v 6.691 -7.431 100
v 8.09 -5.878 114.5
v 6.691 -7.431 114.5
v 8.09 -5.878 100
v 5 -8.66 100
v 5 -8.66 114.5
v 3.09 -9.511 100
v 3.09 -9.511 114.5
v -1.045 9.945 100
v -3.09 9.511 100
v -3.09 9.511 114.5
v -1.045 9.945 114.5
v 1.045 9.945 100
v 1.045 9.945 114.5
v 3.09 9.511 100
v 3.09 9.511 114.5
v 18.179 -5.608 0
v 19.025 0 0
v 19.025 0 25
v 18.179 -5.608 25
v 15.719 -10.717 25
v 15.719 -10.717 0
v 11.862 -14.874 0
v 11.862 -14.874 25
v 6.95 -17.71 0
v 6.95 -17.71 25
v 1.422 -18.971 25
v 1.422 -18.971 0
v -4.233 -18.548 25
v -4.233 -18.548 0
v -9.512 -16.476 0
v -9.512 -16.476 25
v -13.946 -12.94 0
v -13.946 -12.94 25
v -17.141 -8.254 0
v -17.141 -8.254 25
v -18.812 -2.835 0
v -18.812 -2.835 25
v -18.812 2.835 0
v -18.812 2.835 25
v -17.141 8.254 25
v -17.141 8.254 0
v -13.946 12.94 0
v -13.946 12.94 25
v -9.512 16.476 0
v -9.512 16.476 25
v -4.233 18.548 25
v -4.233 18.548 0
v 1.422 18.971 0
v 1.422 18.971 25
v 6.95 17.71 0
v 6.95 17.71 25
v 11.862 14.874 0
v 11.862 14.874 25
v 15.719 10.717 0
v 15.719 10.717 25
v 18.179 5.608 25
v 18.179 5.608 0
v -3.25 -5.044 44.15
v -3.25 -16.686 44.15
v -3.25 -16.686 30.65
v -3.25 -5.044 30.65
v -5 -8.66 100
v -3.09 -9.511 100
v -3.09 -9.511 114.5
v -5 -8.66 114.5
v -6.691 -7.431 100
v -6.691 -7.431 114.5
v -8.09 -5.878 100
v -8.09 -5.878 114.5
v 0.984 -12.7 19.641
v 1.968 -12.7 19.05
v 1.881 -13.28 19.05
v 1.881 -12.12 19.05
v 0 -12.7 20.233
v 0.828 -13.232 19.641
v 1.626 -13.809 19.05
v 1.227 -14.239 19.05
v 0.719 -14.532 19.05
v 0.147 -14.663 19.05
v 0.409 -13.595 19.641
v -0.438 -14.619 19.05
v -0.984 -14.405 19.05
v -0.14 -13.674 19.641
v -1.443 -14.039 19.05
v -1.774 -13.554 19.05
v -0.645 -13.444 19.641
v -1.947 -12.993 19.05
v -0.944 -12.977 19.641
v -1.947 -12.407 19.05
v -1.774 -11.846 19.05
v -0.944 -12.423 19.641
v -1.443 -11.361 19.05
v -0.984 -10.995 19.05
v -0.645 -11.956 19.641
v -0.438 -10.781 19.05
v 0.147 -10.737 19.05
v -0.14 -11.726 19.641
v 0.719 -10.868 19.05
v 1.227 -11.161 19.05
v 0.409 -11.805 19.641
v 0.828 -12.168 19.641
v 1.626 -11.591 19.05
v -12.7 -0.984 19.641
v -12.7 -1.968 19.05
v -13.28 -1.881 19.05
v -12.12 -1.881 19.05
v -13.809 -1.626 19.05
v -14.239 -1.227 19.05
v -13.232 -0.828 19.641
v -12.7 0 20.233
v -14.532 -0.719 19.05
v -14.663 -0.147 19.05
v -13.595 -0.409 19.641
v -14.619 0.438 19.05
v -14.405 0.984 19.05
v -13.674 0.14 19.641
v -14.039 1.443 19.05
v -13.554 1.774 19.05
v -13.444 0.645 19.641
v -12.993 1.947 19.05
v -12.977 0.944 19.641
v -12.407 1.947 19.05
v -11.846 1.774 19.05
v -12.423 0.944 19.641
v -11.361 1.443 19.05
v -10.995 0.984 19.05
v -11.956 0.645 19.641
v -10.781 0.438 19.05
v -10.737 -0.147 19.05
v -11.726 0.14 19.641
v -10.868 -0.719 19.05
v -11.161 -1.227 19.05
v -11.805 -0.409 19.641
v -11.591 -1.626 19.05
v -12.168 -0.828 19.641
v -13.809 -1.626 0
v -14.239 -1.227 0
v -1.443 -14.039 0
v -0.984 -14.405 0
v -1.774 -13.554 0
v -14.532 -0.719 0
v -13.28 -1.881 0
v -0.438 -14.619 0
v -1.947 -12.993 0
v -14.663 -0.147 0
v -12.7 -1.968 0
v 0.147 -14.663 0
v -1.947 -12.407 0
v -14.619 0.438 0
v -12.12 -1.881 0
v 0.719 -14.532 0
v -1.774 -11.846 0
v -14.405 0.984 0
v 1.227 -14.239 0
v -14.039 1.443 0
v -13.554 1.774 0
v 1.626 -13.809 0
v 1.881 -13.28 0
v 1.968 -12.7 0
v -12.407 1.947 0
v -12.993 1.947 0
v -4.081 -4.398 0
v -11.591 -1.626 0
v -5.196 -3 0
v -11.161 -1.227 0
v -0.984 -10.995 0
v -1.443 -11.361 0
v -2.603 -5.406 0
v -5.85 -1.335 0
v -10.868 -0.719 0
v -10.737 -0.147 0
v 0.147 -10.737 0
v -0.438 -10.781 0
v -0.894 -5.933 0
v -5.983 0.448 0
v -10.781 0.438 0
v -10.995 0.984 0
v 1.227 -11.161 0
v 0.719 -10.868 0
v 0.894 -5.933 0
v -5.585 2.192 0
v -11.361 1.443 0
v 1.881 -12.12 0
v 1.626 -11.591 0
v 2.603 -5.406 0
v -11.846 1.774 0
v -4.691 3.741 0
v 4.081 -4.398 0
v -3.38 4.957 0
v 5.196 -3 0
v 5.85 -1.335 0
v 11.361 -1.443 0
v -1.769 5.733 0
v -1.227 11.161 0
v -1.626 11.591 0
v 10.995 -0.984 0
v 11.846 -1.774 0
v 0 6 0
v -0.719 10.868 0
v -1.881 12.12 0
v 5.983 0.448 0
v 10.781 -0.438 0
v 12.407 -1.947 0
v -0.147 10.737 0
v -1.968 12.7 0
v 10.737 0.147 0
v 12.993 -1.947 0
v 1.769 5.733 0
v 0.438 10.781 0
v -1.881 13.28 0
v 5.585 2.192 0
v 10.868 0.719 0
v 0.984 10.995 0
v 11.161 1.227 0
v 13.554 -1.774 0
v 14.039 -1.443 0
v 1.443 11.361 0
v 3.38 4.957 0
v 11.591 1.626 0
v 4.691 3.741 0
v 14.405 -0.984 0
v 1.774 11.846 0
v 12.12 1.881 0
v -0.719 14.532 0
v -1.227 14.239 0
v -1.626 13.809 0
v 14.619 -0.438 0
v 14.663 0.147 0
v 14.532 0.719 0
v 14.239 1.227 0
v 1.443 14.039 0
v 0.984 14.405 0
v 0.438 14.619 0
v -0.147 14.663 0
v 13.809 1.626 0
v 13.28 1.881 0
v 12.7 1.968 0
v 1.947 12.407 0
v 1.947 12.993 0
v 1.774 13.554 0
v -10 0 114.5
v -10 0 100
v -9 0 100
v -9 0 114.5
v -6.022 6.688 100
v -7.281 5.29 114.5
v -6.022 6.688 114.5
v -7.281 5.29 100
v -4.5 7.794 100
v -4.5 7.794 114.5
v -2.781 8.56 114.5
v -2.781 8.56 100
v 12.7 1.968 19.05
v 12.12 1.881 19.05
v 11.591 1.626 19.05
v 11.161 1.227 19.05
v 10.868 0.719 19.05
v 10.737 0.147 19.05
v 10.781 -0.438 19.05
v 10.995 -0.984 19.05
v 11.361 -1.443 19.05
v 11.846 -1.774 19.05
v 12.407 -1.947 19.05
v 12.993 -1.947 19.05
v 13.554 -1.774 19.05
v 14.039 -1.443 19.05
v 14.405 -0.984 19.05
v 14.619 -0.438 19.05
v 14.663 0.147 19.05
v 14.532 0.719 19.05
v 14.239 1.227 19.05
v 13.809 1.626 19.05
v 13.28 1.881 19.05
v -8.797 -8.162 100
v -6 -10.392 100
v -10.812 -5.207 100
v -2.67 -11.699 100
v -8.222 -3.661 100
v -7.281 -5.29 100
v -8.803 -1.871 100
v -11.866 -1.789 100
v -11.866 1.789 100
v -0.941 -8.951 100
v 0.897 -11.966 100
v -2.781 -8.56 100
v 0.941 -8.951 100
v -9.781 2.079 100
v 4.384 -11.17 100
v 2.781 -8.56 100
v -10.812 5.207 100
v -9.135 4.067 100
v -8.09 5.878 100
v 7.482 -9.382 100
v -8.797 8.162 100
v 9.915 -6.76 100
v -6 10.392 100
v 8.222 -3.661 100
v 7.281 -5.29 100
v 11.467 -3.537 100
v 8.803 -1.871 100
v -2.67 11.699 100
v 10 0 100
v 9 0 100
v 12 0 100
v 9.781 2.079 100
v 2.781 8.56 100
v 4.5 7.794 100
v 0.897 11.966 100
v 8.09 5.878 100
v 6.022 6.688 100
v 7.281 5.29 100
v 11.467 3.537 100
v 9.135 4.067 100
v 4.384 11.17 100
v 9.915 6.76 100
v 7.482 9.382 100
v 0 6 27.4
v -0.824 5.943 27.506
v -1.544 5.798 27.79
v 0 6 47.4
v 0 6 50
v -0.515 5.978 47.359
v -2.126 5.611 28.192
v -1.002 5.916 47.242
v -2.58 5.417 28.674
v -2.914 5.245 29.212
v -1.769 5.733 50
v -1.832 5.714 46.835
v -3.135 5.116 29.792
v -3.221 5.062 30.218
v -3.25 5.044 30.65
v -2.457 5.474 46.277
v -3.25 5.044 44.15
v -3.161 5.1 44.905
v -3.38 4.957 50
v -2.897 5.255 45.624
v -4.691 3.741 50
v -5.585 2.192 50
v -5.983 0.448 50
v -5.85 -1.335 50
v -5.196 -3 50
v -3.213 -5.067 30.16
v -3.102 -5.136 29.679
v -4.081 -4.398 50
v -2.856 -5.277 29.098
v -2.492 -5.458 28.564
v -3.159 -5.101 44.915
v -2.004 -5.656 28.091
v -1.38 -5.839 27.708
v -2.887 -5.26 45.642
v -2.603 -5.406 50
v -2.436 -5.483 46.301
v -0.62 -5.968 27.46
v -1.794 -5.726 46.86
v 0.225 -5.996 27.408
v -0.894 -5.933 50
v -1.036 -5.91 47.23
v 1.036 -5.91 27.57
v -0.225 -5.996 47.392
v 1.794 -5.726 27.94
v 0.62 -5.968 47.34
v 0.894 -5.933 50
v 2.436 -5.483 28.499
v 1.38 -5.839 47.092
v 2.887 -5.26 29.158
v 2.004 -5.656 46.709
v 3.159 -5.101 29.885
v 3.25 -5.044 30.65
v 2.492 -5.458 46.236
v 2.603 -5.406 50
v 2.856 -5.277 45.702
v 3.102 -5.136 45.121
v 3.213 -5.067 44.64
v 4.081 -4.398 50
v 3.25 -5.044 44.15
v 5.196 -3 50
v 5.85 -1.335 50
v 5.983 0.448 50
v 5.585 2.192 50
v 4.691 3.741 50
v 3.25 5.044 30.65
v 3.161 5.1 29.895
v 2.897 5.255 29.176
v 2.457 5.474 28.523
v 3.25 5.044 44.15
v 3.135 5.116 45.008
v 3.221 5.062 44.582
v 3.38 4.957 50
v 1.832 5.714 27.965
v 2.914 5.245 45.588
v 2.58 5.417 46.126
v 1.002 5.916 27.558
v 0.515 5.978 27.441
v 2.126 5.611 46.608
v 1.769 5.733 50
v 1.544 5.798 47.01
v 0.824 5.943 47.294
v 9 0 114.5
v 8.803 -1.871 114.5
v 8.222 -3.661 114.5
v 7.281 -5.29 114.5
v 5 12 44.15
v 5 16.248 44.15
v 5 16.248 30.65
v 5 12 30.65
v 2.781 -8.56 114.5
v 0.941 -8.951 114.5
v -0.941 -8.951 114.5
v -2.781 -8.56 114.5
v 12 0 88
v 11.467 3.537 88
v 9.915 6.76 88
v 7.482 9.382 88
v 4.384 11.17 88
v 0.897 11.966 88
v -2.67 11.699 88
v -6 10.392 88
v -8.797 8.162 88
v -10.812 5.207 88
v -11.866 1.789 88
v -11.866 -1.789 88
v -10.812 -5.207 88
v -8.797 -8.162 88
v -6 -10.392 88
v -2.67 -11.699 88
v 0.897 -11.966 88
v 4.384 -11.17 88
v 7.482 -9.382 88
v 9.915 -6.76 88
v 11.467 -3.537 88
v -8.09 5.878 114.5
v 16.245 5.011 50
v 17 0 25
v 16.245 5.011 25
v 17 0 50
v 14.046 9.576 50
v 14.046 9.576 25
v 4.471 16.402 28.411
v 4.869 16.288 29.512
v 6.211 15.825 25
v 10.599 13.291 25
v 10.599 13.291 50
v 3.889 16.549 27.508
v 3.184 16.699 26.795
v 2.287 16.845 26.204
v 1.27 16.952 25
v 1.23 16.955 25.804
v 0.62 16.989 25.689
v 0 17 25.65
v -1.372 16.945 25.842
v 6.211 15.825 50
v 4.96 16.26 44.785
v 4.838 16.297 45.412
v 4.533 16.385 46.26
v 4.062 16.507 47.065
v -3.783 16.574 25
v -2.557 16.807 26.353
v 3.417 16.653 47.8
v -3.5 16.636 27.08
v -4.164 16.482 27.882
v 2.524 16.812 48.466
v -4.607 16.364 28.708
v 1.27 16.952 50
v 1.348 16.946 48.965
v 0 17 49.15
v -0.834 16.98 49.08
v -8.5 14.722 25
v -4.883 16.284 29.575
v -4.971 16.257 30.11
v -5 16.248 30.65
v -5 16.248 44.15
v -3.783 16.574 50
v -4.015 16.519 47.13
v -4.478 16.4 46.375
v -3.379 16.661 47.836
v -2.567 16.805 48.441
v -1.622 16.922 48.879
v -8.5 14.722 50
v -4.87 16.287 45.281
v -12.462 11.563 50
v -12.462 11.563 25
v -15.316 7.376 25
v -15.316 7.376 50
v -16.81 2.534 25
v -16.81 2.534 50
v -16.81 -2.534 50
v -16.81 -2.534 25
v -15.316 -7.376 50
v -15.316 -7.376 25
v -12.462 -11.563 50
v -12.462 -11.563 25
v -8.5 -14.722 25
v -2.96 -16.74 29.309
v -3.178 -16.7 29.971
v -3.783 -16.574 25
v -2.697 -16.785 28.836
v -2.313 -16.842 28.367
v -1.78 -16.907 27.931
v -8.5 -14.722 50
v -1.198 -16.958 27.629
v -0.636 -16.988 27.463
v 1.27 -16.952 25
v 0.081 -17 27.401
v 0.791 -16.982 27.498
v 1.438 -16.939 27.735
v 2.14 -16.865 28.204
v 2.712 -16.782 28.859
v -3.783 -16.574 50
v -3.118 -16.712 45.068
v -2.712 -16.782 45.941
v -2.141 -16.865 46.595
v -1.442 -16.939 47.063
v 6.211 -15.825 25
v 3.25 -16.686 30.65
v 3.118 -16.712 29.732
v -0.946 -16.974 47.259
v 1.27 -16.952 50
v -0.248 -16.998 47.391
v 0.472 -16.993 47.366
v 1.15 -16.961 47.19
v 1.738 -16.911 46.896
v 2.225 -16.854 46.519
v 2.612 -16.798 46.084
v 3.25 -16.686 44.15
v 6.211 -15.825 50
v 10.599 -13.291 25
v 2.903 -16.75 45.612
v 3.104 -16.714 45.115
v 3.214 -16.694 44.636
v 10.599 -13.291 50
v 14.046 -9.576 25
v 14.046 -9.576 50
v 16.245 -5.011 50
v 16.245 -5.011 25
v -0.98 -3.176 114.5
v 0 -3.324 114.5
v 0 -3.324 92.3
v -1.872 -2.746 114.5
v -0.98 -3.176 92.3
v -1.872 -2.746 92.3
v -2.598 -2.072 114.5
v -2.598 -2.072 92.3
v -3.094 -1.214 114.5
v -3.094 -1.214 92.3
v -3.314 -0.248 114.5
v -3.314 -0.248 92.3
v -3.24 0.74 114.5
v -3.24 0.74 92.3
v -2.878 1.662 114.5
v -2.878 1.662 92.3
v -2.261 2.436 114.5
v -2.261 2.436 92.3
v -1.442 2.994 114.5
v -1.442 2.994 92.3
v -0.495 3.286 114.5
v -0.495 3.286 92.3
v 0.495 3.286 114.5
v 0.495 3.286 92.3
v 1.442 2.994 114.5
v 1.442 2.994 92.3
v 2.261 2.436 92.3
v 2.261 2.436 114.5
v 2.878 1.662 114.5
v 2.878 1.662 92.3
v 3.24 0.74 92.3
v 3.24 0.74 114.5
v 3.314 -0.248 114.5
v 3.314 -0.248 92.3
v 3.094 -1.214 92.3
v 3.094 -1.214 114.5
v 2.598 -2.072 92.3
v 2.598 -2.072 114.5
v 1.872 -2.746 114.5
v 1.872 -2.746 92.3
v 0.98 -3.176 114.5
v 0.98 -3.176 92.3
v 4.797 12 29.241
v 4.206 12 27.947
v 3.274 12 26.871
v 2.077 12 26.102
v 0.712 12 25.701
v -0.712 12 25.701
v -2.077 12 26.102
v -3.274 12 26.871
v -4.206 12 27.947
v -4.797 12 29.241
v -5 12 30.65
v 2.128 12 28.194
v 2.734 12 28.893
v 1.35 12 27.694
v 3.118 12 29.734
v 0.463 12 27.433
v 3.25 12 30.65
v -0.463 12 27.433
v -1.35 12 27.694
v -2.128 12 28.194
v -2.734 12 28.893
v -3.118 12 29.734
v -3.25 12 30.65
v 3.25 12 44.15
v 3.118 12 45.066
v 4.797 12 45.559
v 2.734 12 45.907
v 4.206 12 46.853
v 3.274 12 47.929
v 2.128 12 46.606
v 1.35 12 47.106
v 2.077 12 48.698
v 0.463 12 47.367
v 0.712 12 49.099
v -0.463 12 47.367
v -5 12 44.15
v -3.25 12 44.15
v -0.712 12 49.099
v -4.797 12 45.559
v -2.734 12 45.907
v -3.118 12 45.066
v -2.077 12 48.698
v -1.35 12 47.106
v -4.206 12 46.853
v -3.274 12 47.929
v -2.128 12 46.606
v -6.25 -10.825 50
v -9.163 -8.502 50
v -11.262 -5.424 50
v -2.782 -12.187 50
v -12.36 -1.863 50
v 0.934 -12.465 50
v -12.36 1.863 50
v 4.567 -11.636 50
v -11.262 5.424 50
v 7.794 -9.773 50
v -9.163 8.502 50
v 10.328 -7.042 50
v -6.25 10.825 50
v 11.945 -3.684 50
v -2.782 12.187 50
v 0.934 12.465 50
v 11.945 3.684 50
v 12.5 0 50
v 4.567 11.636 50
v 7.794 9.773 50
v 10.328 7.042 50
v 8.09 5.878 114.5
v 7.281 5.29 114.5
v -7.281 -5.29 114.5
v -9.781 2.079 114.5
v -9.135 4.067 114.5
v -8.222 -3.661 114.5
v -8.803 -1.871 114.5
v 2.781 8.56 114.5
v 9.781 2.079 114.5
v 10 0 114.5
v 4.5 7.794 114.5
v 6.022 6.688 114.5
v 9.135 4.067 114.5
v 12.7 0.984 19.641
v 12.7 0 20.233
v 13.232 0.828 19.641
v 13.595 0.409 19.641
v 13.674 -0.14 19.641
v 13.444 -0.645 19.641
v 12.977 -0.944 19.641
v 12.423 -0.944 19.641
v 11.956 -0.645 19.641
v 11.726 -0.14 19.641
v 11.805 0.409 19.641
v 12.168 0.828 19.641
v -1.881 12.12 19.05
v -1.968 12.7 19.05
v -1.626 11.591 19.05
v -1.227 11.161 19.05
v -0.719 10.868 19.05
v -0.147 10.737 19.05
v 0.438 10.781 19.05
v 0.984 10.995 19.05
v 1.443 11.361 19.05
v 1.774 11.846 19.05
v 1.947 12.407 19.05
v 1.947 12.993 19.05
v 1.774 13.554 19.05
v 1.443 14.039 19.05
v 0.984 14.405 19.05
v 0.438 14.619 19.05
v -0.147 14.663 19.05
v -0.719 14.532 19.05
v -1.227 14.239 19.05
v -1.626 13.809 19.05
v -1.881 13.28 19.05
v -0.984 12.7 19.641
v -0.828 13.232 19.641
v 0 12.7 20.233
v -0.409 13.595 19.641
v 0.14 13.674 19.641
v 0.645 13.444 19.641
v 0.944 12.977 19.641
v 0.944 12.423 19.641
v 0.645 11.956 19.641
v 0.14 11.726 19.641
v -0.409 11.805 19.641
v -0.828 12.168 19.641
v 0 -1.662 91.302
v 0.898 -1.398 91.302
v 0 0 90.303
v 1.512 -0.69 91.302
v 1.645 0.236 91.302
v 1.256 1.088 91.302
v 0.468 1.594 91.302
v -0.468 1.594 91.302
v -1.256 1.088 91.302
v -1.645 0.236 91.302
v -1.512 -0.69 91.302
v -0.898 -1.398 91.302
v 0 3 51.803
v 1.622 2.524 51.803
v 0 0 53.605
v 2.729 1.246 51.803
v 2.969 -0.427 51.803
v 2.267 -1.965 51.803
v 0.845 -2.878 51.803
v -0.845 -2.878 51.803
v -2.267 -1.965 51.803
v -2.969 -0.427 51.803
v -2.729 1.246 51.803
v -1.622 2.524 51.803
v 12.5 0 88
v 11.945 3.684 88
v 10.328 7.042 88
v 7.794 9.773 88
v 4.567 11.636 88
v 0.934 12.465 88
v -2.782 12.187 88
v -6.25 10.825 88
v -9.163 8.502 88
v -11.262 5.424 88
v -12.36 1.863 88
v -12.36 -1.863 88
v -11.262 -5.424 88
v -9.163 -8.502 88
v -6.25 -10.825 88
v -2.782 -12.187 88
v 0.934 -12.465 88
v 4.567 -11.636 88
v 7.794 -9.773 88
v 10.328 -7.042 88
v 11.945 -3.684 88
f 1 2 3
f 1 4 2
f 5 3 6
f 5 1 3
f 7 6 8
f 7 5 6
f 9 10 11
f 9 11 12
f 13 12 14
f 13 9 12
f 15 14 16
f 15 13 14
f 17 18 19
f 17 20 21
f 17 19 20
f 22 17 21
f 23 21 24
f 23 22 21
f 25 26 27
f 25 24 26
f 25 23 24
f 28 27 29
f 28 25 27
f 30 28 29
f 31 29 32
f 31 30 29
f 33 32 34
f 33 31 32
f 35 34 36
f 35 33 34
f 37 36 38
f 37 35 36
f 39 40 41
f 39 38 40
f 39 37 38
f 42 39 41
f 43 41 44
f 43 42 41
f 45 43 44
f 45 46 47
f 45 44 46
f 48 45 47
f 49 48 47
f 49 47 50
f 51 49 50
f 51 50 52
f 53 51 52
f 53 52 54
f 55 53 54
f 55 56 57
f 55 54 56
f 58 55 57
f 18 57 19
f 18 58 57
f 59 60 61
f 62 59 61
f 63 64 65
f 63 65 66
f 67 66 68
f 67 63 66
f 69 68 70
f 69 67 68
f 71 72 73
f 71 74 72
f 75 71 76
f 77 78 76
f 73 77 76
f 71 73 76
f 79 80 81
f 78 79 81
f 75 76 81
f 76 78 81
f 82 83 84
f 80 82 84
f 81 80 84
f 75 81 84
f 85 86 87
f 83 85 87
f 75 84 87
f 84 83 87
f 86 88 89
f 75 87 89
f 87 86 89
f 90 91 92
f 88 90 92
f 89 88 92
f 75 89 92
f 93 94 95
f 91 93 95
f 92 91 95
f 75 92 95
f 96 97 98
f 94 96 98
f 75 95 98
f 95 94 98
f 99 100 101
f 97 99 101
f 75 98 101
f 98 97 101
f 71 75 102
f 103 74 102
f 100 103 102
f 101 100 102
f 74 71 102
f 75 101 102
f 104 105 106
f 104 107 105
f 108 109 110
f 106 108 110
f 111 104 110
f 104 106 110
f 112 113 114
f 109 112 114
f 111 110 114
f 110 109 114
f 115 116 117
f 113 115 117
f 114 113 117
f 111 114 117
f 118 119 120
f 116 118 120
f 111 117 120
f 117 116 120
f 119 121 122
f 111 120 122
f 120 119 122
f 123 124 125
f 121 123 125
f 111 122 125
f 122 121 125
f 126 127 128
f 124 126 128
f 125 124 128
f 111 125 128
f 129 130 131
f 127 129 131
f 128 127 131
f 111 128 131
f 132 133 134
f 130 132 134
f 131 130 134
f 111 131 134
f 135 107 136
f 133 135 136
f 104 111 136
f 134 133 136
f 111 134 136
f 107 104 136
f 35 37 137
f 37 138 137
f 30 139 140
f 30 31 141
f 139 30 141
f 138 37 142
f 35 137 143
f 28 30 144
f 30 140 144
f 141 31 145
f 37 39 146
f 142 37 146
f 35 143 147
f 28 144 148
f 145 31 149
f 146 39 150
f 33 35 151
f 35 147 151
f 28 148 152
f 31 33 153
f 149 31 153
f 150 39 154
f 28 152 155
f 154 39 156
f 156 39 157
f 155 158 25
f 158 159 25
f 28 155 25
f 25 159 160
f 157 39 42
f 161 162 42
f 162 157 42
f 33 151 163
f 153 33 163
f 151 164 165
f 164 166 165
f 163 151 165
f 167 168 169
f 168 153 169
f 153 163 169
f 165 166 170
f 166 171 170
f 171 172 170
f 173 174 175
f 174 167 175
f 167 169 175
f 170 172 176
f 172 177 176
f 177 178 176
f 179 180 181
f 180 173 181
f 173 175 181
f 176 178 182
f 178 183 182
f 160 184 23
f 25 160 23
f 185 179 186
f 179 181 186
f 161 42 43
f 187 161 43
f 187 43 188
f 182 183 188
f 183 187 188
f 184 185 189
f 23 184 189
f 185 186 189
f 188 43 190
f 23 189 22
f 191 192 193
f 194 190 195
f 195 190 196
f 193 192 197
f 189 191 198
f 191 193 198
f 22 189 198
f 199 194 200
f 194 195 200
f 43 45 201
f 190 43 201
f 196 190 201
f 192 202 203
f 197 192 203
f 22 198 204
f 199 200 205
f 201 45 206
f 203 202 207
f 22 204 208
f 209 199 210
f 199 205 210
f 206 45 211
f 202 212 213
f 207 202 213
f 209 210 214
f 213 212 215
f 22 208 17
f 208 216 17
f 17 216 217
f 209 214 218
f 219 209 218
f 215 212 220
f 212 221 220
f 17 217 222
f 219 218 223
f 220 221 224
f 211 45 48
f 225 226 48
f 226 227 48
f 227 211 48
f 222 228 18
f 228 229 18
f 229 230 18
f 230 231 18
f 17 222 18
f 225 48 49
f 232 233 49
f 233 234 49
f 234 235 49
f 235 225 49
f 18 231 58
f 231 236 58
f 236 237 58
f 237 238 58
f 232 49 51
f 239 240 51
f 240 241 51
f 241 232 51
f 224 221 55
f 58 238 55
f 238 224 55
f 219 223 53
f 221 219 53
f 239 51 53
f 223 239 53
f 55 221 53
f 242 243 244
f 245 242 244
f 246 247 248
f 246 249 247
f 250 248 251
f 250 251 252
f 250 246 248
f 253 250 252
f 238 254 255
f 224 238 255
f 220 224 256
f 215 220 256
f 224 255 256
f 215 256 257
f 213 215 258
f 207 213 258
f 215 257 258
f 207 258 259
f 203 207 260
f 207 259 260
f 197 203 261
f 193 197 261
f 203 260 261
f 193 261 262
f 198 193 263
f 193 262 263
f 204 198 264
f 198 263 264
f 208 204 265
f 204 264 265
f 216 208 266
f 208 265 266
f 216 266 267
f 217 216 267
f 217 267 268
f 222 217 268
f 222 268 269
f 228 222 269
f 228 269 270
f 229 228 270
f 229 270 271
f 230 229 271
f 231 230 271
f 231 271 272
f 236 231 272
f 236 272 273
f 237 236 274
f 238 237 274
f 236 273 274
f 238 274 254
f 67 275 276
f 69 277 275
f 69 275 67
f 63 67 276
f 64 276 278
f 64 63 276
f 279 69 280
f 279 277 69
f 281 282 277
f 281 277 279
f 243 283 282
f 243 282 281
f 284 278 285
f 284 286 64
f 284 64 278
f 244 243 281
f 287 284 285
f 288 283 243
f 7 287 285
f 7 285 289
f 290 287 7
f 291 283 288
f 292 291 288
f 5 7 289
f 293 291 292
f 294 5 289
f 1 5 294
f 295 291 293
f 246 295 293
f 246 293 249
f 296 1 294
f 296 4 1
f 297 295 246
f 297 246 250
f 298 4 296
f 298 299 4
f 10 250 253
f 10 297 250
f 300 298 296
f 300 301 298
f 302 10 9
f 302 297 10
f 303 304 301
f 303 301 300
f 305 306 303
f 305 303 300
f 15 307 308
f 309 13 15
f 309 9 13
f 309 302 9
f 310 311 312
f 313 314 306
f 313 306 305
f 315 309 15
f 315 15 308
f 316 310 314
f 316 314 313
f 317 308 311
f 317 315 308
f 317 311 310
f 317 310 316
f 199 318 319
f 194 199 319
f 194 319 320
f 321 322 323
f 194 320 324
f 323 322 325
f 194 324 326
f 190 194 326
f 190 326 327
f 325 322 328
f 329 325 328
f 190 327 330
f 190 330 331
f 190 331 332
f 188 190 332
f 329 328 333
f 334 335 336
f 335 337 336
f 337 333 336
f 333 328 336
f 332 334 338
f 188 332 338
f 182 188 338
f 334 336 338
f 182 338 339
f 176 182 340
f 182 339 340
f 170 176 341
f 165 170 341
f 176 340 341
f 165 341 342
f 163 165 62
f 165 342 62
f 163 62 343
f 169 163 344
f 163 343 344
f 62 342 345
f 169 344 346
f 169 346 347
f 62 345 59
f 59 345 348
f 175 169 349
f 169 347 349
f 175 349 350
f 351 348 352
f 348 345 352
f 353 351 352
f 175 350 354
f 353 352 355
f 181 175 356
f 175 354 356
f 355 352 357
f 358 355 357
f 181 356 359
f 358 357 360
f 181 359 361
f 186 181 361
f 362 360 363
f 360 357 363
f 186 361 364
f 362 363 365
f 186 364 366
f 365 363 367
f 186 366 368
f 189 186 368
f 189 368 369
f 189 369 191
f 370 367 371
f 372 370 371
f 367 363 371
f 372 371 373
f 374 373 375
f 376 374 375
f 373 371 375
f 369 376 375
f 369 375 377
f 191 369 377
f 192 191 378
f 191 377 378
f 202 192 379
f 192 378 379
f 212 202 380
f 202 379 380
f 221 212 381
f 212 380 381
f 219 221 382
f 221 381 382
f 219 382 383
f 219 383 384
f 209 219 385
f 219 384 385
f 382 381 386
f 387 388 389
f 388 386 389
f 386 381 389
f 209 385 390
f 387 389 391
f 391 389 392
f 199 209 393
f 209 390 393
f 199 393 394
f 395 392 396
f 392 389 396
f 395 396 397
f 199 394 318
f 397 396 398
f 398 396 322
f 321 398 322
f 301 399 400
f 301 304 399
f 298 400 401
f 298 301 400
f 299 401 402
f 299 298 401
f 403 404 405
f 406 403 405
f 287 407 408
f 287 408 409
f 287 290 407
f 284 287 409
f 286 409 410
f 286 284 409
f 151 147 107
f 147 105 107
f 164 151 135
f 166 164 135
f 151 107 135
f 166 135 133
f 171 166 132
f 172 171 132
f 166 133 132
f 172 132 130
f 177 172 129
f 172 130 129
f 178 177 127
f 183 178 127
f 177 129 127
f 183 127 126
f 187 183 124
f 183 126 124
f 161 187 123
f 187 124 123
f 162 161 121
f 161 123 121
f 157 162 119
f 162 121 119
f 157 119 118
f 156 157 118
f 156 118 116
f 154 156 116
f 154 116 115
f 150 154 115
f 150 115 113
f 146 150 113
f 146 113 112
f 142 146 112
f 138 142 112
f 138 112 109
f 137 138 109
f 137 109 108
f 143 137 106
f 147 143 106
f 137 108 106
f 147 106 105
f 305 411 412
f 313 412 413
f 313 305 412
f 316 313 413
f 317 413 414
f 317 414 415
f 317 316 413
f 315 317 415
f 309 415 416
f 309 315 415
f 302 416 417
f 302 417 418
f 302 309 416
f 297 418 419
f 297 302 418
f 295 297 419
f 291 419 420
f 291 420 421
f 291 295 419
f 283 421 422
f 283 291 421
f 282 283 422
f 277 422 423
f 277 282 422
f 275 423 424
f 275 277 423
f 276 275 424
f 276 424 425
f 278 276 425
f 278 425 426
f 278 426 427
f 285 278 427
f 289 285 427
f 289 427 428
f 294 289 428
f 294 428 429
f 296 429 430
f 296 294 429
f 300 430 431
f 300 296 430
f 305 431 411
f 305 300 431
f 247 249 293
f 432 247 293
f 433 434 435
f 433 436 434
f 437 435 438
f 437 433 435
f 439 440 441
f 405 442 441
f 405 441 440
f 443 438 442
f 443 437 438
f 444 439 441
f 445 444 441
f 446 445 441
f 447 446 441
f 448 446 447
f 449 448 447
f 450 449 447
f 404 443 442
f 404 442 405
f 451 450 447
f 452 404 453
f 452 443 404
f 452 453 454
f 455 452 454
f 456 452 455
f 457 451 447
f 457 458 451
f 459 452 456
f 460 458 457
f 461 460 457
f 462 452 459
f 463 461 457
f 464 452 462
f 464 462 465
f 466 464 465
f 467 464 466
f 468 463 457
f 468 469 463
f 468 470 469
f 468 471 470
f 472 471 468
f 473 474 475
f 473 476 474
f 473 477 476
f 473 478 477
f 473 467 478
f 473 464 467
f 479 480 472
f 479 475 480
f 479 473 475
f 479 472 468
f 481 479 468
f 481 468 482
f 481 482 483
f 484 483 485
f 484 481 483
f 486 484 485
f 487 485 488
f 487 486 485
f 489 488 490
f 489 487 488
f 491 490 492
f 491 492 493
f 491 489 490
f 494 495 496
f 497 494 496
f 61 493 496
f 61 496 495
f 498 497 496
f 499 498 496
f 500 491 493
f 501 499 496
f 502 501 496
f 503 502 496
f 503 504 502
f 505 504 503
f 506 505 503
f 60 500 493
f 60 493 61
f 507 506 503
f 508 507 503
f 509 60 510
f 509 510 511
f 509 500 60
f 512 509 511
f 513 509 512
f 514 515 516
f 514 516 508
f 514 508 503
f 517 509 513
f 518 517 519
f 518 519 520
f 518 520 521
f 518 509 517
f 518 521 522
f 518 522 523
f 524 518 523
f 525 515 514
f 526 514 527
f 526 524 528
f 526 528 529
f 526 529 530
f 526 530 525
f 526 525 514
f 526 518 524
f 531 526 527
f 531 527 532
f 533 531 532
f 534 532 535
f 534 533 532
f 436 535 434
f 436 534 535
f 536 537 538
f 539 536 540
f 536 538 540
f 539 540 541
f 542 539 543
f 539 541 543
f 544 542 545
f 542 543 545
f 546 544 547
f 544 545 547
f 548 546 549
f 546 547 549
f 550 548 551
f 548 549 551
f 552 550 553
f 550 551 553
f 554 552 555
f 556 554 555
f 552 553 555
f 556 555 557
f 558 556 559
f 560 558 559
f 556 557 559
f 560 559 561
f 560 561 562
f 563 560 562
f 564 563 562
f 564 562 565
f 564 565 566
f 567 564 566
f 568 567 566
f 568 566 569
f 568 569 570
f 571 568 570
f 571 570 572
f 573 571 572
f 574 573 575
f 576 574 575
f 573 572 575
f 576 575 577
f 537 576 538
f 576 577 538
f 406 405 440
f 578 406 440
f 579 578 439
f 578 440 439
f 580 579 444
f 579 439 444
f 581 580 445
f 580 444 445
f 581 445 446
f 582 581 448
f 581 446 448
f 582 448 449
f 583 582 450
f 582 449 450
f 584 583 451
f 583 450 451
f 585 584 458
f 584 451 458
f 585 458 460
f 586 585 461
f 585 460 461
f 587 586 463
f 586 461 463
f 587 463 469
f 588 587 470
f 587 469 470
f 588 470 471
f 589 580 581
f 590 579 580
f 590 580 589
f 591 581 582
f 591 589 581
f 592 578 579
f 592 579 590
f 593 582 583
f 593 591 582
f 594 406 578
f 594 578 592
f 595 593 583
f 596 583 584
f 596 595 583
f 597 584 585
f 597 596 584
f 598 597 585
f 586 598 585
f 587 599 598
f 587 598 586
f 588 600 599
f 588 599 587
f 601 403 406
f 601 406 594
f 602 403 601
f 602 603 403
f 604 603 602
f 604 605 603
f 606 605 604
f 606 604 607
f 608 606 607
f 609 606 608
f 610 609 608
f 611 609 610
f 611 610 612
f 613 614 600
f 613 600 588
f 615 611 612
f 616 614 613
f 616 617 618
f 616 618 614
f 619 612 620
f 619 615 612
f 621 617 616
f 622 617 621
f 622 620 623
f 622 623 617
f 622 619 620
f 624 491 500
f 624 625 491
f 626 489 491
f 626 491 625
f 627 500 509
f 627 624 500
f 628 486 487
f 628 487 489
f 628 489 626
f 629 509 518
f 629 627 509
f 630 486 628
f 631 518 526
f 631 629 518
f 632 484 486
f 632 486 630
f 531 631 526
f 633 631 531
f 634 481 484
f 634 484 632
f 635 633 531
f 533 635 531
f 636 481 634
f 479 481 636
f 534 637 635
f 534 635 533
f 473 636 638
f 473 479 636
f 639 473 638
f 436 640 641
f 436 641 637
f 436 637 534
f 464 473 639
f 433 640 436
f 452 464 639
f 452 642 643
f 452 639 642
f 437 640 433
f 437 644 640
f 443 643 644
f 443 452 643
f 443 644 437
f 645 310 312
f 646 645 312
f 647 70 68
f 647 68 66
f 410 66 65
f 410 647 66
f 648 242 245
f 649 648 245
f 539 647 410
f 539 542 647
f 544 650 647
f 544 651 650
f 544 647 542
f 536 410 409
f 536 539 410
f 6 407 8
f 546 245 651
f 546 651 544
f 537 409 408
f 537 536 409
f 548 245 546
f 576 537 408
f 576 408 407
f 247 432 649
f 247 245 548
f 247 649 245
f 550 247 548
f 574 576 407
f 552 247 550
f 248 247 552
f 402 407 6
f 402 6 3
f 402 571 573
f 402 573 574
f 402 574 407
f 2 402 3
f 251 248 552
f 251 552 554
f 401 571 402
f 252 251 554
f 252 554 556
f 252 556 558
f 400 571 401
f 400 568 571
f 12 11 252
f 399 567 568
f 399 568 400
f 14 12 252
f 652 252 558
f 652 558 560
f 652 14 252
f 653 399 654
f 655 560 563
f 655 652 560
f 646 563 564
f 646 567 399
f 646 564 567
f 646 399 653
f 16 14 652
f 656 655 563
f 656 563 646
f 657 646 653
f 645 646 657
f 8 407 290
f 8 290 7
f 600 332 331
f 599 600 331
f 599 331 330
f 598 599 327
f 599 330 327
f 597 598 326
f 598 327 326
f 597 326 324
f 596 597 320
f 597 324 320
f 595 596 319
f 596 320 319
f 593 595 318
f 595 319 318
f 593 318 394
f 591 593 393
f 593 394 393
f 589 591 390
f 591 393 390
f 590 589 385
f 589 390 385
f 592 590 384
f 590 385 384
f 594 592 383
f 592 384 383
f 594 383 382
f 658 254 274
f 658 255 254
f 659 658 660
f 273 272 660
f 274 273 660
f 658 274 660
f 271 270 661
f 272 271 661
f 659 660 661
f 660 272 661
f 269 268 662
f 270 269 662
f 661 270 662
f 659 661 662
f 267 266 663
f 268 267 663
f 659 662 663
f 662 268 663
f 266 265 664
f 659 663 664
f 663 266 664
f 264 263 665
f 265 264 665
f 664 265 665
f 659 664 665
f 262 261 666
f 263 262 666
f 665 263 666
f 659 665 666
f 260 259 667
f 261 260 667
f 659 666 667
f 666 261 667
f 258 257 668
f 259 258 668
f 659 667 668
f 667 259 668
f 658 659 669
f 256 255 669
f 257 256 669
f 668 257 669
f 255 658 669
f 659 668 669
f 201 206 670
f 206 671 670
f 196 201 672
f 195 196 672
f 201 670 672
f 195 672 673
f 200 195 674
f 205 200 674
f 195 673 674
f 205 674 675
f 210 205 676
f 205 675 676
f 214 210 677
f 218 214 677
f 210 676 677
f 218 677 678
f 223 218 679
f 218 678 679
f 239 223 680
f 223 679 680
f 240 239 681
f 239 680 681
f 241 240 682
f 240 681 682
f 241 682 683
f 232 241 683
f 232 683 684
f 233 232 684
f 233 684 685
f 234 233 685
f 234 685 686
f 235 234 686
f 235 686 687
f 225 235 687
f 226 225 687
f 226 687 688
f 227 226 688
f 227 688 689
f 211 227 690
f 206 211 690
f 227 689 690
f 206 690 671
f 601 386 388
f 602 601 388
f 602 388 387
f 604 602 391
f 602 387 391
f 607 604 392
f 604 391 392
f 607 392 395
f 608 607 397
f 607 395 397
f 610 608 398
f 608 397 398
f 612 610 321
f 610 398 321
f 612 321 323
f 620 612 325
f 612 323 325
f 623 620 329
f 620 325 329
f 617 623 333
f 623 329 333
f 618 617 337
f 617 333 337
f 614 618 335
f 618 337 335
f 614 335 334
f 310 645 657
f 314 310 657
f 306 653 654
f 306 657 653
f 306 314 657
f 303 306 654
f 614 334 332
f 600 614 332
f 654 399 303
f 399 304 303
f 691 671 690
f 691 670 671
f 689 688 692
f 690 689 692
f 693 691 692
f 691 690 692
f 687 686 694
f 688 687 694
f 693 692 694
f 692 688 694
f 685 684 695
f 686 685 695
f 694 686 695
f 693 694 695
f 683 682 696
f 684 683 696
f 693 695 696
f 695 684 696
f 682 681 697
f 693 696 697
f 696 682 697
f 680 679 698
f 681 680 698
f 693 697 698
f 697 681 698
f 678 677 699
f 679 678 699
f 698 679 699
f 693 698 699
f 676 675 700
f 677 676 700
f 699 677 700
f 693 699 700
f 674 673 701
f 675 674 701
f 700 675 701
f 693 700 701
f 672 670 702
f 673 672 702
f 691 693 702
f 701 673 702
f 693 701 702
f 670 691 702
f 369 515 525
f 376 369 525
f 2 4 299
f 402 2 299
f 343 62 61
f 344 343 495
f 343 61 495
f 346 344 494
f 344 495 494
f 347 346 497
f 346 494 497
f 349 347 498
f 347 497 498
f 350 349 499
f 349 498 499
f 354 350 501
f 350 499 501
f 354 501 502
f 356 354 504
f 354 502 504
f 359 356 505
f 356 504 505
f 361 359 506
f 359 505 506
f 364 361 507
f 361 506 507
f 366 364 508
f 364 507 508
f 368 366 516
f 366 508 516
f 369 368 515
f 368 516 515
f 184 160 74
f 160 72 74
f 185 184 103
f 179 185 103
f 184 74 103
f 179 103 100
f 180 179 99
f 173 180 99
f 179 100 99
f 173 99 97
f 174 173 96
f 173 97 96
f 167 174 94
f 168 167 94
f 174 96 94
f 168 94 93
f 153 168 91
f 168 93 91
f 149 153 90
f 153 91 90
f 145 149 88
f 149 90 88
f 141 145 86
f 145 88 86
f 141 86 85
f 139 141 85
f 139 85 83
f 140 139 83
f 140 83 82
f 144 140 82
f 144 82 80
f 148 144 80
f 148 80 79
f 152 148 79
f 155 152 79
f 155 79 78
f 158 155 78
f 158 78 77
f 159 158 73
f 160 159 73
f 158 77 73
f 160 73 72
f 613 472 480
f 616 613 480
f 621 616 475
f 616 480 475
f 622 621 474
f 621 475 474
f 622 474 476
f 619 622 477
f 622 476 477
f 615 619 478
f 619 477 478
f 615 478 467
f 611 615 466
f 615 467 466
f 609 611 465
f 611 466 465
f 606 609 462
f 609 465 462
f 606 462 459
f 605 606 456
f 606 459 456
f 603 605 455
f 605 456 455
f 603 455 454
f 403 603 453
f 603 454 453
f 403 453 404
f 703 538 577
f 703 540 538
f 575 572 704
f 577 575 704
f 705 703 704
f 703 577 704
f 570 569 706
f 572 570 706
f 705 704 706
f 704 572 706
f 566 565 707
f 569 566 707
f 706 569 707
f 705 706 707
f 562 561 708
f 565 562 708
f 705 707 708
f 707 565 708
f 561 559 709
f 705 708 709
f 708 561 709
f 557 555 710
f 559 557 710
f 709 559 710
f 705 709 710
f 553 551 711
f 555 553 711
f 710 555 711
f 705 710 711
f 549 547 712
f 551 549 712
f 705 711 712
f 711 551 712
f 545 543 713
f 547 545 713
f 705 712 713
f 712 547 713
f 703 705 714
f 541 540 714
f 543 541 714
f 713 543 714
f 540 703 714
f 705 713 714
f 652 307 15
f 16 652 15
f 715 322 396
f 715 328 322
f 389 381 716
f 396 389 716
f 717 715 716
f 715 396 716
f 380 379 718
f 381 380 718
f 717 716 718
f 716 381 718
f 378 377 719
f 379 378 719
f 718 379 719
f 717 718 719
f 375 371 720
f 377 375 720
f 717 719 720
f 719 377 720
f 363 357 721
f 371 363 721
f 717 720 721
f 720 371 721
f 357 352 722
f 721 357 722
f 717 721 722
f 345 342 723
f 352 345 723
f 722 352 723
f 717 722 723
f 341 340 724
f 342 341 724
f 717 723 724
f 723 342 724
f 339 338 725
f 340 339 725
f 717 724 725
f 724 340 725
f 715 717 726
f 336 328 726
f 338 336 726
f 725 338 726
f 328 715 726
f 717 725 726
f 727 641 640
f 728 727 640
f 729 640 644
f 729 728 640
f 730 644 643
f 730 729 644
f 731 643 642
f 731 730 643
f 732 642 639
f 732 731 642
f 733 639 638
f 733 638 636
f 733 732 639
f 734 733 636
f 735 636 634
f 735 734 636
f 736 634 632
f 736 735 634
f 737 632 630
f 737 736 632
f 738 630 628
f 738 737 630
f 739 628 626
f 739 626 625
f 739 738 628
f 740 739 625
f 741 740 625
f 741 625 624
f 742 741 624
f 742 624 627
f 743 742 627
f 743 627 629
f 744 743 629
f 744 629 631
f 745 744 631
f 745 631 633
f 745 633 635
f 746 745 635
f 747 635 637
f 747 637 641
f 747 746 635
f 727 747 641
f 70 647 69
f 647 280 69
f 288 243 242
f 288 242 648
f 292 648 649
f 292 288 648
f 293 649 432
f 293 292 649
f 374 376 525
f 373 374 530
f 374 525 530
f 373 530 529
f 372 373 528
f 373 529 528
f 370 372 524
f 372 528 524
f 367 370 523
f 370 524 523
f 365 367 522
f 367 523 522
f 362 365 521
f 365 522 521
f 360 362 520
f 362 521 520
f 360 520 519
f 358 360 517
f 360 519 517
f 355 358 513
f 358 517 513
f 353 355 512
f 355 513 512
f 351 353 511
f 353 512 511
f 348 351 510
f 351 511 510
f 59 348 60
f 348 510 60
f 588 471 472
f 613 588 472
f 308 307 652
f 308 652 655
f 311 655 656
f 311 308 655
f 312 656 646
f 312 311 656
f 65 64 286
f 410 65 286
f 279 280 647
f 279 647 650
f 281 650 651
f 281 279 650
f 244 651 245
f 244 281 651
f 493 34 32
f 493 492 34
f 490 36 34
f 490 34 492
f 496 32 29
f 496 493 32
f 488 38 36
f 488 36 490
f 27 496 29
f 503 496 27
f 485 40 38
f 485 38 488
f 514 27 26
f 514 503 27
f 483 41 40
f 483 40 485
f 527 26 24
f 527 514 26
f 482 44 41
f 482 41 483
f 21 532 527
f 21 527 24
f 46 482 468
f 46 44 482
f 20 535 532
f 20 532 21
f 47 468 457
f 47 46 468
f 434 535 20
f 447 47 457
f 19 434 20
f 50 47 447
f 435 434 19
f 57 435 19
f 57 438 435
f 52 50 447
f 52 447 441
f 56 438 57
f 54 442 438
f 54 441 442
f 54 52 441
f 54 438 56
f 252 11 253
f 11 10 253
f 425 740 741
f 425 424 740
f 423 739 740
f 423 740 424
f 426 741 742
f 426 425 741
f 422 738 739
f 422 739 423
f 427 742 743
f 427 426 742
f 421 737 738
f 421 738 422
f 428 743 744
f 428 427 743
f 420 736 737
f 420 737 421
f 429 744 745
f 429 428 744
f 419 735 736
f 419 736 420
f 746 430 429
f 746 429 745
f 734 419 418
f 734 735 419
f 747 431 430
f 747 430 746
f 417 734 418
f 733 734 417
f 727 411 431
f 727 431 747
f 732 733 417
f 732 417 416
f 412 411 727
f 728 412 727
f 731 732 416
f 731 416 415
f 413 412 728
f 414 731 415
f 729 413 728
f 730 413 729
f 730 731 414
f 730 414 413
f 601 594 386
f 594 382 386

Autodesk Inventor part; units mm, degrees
ref_plane "YZ Plane" through (0, 0, 0) normal (1, 0, 0) x (0, 1, 0)
ref_plane "Offsets" through (0, 0, 50) normal (0, 0, 1) x (1, 0, 0)
ref_plane "Work Plane4" through (0, 0, 25) normal (0, 0, 1) x (1, 0, 0)
sketch "Sketch1" plane through (0, 0, 0) normal (0, 0, 1) x (1, 0, 0)
  circle A0 centre (0, 0) radius 19.0246
  dimension "d0" = 38.0492
extrude "Extrusion1" add sketch "Sketch1" along normal blind 100
sketch "Sketch2" plane through (0, 0, 100) normal (0, 0, 1) x (1, 0, 0)
  circle A0 centre (0, 0) radius 19.0246 projected
  circle A1 centre (0, 0) radius 17
  dimension "d3" = 34
extrude "Extrusion2" cut sketch "Sketch2" against normal up to surface (75 mm away)
sketch "Sketch8" plane through (0, 0, 100) normal (0, 0, 1) x (1, 0, 0)
  circle A0 centre (0, 0) radius 17 projected
  circle A1 centre (0, 0) radius 12.5
  dimension "d75" = 25
extrude "Extrusion7" cut sketch "Sketch8" against normal up to surface (50 mm away)
sketch "Sketch3" plane through (0, 0, 0) normal (0, 0, -1) x (-1, 0, 0)
  circle A0 centre (0, 0) radius 19.0246 projected
hole "Hole1" at (0, 0, 0) direction (0, 0, 1) diameter 12 depth 50 tip angle 118
sketch "Sketch4" plane through (0, 0, 0) normal (0, 1, 0) x (-1, 0, 0)
  line L0 (-19.0246, 0) -> (19.0246, 0) projected
  line L1 (3.25, 44.15) -> (3.25, 30.65)
  line L2 (-3.25, 30.65) -> (-3.25, 44.15)
  arc A0 (-3.25, 30.65) -> (3.25, 30.65) centre (0, 30.65) ccw
  arc A1 (3.25, 44.15) -> (-3.25, 44.15) centre (0, 44.15) ccw
  line L3 (0, -9.83) -> (0, 58.98) projected
  line L4 (-5, 44.15) -> (-5, 30.65)
  arc A2 (-5, 30.65) -> (5, 30.65) centre (0, 30.65) ccw
  line L5 (5, 30.65) -> (5, 44.15)
  arc A3 (5, 44.15) -> (-5, 44.15) centre (0, 44.15) ccw
  point P0 (-19.0246, 25.4)
  point P1 (19.0246, 25.4)
  dimension "d13" = 6.5
  dimension "d15" = 20
  dimension "d76" = 5
extrude "Extrusion3" cut sketch "Sketch4" along normal through all both and the other way through all contours L1 A0 L3 A1 | L3 A0 L2 A1
sketch "Sketch9" plane through (0, 0, 0) normal (0, 0, -1) x (-1, 0, 0)
  circle A0 centre (0, 0) radius 19.0246 projected
  circle A1 centre (0, 0) radius 12.7 construction
  point P0 (-12.7, 0)
  dimension "d49" = 25.4
hole "Hole3" at (12.7, 0, 0) direction (0, 0, 1) diameter 3.937 depth 19.05 tip angle 118 thread size "10-24 UNC" class "2B" standard "ANSI Unified Screw Threads"
pattern_circular "Circular Pattern1" count 4 over 360 about axis through (0, 0, 25) along (0, 0, -1) of "Hole3"
ref_plane "Work Plane3" through (0, 17, 100) normal (0, 1, 0) x (-1, 0, 0)
extrude "Extrusion12" cut sketch "Sketch4" against normal blind 5 from surface at 17
sketch "Sketch12" plane through (0, 0, 100) normal (0, 0, 1) x (1, 0, 0)
  circle A0 centre (0, 0) radius 10
  circle A1 centre (0, 0) radius 9
  line L0 (-3.0902, 9.5106) -> (-3.0902, 8.4529) construction
  line L1 (3.0902, 9.5106) -> (3.0902, 8.4529) construction
  line L2 (-3.0902, 9.5106) -> (0, 0)
  line L3 (0, 0) -> (3.0902, 9.5106)
  point P0 (2.7812, 8.5595)
  point P1 (-2.7812, 8.5595)
  dimension "d85" = 20
  dimension "d98" = 18
  dimension "d112" = 36
sketch "Sketch15" plane through (0, 0, 100) normal (0, 0, 1) x (1, 0, 0)
  circle A0 centre (0, 0) radius 12
  circle A1 centre (0, 0) radius 12.5 projected
  dimension "d113" = 24
extrude "Extrusion15" cut sketch "Sketch15" against normal blind 12
thread "Thread1" size "M24x2" class "6g" standard "ISO Metric profile" full length
extrude "Extrusion13" add sketch "Sketch12" along normal blind 14.5 contours L3 L2 A1 | A1 L2 L3
extrude "Extrusion14" add sketch "Sketch12" along normal up to surface (14.5 mm away) contours L3 A1 L2 A0 picked at (1.6921, 9.4688)
pattern_circular "Circular Pattern2" count 5 over 360 about axis through (0, 0, -10) along (0, 0, 1) of "Extrusion14"
sketch "Sketch14" plane through (0, 0, 114.5) normal (0, 0, 1) x (1, 0, 0)
  point P0 (0, 0)
  point P1 (0, 0)
  point P2 (0, 0)
hole "Hole6" at (0, 0, 114.5) direction (0, 0, -1) diameter 6.647 depth 22.2 tip angle 118 thread size "M8x1.25" class "6H" standard "ISO Metric profile"
properties part number "PWTR-0035" material "Stainless Steel, 303"
